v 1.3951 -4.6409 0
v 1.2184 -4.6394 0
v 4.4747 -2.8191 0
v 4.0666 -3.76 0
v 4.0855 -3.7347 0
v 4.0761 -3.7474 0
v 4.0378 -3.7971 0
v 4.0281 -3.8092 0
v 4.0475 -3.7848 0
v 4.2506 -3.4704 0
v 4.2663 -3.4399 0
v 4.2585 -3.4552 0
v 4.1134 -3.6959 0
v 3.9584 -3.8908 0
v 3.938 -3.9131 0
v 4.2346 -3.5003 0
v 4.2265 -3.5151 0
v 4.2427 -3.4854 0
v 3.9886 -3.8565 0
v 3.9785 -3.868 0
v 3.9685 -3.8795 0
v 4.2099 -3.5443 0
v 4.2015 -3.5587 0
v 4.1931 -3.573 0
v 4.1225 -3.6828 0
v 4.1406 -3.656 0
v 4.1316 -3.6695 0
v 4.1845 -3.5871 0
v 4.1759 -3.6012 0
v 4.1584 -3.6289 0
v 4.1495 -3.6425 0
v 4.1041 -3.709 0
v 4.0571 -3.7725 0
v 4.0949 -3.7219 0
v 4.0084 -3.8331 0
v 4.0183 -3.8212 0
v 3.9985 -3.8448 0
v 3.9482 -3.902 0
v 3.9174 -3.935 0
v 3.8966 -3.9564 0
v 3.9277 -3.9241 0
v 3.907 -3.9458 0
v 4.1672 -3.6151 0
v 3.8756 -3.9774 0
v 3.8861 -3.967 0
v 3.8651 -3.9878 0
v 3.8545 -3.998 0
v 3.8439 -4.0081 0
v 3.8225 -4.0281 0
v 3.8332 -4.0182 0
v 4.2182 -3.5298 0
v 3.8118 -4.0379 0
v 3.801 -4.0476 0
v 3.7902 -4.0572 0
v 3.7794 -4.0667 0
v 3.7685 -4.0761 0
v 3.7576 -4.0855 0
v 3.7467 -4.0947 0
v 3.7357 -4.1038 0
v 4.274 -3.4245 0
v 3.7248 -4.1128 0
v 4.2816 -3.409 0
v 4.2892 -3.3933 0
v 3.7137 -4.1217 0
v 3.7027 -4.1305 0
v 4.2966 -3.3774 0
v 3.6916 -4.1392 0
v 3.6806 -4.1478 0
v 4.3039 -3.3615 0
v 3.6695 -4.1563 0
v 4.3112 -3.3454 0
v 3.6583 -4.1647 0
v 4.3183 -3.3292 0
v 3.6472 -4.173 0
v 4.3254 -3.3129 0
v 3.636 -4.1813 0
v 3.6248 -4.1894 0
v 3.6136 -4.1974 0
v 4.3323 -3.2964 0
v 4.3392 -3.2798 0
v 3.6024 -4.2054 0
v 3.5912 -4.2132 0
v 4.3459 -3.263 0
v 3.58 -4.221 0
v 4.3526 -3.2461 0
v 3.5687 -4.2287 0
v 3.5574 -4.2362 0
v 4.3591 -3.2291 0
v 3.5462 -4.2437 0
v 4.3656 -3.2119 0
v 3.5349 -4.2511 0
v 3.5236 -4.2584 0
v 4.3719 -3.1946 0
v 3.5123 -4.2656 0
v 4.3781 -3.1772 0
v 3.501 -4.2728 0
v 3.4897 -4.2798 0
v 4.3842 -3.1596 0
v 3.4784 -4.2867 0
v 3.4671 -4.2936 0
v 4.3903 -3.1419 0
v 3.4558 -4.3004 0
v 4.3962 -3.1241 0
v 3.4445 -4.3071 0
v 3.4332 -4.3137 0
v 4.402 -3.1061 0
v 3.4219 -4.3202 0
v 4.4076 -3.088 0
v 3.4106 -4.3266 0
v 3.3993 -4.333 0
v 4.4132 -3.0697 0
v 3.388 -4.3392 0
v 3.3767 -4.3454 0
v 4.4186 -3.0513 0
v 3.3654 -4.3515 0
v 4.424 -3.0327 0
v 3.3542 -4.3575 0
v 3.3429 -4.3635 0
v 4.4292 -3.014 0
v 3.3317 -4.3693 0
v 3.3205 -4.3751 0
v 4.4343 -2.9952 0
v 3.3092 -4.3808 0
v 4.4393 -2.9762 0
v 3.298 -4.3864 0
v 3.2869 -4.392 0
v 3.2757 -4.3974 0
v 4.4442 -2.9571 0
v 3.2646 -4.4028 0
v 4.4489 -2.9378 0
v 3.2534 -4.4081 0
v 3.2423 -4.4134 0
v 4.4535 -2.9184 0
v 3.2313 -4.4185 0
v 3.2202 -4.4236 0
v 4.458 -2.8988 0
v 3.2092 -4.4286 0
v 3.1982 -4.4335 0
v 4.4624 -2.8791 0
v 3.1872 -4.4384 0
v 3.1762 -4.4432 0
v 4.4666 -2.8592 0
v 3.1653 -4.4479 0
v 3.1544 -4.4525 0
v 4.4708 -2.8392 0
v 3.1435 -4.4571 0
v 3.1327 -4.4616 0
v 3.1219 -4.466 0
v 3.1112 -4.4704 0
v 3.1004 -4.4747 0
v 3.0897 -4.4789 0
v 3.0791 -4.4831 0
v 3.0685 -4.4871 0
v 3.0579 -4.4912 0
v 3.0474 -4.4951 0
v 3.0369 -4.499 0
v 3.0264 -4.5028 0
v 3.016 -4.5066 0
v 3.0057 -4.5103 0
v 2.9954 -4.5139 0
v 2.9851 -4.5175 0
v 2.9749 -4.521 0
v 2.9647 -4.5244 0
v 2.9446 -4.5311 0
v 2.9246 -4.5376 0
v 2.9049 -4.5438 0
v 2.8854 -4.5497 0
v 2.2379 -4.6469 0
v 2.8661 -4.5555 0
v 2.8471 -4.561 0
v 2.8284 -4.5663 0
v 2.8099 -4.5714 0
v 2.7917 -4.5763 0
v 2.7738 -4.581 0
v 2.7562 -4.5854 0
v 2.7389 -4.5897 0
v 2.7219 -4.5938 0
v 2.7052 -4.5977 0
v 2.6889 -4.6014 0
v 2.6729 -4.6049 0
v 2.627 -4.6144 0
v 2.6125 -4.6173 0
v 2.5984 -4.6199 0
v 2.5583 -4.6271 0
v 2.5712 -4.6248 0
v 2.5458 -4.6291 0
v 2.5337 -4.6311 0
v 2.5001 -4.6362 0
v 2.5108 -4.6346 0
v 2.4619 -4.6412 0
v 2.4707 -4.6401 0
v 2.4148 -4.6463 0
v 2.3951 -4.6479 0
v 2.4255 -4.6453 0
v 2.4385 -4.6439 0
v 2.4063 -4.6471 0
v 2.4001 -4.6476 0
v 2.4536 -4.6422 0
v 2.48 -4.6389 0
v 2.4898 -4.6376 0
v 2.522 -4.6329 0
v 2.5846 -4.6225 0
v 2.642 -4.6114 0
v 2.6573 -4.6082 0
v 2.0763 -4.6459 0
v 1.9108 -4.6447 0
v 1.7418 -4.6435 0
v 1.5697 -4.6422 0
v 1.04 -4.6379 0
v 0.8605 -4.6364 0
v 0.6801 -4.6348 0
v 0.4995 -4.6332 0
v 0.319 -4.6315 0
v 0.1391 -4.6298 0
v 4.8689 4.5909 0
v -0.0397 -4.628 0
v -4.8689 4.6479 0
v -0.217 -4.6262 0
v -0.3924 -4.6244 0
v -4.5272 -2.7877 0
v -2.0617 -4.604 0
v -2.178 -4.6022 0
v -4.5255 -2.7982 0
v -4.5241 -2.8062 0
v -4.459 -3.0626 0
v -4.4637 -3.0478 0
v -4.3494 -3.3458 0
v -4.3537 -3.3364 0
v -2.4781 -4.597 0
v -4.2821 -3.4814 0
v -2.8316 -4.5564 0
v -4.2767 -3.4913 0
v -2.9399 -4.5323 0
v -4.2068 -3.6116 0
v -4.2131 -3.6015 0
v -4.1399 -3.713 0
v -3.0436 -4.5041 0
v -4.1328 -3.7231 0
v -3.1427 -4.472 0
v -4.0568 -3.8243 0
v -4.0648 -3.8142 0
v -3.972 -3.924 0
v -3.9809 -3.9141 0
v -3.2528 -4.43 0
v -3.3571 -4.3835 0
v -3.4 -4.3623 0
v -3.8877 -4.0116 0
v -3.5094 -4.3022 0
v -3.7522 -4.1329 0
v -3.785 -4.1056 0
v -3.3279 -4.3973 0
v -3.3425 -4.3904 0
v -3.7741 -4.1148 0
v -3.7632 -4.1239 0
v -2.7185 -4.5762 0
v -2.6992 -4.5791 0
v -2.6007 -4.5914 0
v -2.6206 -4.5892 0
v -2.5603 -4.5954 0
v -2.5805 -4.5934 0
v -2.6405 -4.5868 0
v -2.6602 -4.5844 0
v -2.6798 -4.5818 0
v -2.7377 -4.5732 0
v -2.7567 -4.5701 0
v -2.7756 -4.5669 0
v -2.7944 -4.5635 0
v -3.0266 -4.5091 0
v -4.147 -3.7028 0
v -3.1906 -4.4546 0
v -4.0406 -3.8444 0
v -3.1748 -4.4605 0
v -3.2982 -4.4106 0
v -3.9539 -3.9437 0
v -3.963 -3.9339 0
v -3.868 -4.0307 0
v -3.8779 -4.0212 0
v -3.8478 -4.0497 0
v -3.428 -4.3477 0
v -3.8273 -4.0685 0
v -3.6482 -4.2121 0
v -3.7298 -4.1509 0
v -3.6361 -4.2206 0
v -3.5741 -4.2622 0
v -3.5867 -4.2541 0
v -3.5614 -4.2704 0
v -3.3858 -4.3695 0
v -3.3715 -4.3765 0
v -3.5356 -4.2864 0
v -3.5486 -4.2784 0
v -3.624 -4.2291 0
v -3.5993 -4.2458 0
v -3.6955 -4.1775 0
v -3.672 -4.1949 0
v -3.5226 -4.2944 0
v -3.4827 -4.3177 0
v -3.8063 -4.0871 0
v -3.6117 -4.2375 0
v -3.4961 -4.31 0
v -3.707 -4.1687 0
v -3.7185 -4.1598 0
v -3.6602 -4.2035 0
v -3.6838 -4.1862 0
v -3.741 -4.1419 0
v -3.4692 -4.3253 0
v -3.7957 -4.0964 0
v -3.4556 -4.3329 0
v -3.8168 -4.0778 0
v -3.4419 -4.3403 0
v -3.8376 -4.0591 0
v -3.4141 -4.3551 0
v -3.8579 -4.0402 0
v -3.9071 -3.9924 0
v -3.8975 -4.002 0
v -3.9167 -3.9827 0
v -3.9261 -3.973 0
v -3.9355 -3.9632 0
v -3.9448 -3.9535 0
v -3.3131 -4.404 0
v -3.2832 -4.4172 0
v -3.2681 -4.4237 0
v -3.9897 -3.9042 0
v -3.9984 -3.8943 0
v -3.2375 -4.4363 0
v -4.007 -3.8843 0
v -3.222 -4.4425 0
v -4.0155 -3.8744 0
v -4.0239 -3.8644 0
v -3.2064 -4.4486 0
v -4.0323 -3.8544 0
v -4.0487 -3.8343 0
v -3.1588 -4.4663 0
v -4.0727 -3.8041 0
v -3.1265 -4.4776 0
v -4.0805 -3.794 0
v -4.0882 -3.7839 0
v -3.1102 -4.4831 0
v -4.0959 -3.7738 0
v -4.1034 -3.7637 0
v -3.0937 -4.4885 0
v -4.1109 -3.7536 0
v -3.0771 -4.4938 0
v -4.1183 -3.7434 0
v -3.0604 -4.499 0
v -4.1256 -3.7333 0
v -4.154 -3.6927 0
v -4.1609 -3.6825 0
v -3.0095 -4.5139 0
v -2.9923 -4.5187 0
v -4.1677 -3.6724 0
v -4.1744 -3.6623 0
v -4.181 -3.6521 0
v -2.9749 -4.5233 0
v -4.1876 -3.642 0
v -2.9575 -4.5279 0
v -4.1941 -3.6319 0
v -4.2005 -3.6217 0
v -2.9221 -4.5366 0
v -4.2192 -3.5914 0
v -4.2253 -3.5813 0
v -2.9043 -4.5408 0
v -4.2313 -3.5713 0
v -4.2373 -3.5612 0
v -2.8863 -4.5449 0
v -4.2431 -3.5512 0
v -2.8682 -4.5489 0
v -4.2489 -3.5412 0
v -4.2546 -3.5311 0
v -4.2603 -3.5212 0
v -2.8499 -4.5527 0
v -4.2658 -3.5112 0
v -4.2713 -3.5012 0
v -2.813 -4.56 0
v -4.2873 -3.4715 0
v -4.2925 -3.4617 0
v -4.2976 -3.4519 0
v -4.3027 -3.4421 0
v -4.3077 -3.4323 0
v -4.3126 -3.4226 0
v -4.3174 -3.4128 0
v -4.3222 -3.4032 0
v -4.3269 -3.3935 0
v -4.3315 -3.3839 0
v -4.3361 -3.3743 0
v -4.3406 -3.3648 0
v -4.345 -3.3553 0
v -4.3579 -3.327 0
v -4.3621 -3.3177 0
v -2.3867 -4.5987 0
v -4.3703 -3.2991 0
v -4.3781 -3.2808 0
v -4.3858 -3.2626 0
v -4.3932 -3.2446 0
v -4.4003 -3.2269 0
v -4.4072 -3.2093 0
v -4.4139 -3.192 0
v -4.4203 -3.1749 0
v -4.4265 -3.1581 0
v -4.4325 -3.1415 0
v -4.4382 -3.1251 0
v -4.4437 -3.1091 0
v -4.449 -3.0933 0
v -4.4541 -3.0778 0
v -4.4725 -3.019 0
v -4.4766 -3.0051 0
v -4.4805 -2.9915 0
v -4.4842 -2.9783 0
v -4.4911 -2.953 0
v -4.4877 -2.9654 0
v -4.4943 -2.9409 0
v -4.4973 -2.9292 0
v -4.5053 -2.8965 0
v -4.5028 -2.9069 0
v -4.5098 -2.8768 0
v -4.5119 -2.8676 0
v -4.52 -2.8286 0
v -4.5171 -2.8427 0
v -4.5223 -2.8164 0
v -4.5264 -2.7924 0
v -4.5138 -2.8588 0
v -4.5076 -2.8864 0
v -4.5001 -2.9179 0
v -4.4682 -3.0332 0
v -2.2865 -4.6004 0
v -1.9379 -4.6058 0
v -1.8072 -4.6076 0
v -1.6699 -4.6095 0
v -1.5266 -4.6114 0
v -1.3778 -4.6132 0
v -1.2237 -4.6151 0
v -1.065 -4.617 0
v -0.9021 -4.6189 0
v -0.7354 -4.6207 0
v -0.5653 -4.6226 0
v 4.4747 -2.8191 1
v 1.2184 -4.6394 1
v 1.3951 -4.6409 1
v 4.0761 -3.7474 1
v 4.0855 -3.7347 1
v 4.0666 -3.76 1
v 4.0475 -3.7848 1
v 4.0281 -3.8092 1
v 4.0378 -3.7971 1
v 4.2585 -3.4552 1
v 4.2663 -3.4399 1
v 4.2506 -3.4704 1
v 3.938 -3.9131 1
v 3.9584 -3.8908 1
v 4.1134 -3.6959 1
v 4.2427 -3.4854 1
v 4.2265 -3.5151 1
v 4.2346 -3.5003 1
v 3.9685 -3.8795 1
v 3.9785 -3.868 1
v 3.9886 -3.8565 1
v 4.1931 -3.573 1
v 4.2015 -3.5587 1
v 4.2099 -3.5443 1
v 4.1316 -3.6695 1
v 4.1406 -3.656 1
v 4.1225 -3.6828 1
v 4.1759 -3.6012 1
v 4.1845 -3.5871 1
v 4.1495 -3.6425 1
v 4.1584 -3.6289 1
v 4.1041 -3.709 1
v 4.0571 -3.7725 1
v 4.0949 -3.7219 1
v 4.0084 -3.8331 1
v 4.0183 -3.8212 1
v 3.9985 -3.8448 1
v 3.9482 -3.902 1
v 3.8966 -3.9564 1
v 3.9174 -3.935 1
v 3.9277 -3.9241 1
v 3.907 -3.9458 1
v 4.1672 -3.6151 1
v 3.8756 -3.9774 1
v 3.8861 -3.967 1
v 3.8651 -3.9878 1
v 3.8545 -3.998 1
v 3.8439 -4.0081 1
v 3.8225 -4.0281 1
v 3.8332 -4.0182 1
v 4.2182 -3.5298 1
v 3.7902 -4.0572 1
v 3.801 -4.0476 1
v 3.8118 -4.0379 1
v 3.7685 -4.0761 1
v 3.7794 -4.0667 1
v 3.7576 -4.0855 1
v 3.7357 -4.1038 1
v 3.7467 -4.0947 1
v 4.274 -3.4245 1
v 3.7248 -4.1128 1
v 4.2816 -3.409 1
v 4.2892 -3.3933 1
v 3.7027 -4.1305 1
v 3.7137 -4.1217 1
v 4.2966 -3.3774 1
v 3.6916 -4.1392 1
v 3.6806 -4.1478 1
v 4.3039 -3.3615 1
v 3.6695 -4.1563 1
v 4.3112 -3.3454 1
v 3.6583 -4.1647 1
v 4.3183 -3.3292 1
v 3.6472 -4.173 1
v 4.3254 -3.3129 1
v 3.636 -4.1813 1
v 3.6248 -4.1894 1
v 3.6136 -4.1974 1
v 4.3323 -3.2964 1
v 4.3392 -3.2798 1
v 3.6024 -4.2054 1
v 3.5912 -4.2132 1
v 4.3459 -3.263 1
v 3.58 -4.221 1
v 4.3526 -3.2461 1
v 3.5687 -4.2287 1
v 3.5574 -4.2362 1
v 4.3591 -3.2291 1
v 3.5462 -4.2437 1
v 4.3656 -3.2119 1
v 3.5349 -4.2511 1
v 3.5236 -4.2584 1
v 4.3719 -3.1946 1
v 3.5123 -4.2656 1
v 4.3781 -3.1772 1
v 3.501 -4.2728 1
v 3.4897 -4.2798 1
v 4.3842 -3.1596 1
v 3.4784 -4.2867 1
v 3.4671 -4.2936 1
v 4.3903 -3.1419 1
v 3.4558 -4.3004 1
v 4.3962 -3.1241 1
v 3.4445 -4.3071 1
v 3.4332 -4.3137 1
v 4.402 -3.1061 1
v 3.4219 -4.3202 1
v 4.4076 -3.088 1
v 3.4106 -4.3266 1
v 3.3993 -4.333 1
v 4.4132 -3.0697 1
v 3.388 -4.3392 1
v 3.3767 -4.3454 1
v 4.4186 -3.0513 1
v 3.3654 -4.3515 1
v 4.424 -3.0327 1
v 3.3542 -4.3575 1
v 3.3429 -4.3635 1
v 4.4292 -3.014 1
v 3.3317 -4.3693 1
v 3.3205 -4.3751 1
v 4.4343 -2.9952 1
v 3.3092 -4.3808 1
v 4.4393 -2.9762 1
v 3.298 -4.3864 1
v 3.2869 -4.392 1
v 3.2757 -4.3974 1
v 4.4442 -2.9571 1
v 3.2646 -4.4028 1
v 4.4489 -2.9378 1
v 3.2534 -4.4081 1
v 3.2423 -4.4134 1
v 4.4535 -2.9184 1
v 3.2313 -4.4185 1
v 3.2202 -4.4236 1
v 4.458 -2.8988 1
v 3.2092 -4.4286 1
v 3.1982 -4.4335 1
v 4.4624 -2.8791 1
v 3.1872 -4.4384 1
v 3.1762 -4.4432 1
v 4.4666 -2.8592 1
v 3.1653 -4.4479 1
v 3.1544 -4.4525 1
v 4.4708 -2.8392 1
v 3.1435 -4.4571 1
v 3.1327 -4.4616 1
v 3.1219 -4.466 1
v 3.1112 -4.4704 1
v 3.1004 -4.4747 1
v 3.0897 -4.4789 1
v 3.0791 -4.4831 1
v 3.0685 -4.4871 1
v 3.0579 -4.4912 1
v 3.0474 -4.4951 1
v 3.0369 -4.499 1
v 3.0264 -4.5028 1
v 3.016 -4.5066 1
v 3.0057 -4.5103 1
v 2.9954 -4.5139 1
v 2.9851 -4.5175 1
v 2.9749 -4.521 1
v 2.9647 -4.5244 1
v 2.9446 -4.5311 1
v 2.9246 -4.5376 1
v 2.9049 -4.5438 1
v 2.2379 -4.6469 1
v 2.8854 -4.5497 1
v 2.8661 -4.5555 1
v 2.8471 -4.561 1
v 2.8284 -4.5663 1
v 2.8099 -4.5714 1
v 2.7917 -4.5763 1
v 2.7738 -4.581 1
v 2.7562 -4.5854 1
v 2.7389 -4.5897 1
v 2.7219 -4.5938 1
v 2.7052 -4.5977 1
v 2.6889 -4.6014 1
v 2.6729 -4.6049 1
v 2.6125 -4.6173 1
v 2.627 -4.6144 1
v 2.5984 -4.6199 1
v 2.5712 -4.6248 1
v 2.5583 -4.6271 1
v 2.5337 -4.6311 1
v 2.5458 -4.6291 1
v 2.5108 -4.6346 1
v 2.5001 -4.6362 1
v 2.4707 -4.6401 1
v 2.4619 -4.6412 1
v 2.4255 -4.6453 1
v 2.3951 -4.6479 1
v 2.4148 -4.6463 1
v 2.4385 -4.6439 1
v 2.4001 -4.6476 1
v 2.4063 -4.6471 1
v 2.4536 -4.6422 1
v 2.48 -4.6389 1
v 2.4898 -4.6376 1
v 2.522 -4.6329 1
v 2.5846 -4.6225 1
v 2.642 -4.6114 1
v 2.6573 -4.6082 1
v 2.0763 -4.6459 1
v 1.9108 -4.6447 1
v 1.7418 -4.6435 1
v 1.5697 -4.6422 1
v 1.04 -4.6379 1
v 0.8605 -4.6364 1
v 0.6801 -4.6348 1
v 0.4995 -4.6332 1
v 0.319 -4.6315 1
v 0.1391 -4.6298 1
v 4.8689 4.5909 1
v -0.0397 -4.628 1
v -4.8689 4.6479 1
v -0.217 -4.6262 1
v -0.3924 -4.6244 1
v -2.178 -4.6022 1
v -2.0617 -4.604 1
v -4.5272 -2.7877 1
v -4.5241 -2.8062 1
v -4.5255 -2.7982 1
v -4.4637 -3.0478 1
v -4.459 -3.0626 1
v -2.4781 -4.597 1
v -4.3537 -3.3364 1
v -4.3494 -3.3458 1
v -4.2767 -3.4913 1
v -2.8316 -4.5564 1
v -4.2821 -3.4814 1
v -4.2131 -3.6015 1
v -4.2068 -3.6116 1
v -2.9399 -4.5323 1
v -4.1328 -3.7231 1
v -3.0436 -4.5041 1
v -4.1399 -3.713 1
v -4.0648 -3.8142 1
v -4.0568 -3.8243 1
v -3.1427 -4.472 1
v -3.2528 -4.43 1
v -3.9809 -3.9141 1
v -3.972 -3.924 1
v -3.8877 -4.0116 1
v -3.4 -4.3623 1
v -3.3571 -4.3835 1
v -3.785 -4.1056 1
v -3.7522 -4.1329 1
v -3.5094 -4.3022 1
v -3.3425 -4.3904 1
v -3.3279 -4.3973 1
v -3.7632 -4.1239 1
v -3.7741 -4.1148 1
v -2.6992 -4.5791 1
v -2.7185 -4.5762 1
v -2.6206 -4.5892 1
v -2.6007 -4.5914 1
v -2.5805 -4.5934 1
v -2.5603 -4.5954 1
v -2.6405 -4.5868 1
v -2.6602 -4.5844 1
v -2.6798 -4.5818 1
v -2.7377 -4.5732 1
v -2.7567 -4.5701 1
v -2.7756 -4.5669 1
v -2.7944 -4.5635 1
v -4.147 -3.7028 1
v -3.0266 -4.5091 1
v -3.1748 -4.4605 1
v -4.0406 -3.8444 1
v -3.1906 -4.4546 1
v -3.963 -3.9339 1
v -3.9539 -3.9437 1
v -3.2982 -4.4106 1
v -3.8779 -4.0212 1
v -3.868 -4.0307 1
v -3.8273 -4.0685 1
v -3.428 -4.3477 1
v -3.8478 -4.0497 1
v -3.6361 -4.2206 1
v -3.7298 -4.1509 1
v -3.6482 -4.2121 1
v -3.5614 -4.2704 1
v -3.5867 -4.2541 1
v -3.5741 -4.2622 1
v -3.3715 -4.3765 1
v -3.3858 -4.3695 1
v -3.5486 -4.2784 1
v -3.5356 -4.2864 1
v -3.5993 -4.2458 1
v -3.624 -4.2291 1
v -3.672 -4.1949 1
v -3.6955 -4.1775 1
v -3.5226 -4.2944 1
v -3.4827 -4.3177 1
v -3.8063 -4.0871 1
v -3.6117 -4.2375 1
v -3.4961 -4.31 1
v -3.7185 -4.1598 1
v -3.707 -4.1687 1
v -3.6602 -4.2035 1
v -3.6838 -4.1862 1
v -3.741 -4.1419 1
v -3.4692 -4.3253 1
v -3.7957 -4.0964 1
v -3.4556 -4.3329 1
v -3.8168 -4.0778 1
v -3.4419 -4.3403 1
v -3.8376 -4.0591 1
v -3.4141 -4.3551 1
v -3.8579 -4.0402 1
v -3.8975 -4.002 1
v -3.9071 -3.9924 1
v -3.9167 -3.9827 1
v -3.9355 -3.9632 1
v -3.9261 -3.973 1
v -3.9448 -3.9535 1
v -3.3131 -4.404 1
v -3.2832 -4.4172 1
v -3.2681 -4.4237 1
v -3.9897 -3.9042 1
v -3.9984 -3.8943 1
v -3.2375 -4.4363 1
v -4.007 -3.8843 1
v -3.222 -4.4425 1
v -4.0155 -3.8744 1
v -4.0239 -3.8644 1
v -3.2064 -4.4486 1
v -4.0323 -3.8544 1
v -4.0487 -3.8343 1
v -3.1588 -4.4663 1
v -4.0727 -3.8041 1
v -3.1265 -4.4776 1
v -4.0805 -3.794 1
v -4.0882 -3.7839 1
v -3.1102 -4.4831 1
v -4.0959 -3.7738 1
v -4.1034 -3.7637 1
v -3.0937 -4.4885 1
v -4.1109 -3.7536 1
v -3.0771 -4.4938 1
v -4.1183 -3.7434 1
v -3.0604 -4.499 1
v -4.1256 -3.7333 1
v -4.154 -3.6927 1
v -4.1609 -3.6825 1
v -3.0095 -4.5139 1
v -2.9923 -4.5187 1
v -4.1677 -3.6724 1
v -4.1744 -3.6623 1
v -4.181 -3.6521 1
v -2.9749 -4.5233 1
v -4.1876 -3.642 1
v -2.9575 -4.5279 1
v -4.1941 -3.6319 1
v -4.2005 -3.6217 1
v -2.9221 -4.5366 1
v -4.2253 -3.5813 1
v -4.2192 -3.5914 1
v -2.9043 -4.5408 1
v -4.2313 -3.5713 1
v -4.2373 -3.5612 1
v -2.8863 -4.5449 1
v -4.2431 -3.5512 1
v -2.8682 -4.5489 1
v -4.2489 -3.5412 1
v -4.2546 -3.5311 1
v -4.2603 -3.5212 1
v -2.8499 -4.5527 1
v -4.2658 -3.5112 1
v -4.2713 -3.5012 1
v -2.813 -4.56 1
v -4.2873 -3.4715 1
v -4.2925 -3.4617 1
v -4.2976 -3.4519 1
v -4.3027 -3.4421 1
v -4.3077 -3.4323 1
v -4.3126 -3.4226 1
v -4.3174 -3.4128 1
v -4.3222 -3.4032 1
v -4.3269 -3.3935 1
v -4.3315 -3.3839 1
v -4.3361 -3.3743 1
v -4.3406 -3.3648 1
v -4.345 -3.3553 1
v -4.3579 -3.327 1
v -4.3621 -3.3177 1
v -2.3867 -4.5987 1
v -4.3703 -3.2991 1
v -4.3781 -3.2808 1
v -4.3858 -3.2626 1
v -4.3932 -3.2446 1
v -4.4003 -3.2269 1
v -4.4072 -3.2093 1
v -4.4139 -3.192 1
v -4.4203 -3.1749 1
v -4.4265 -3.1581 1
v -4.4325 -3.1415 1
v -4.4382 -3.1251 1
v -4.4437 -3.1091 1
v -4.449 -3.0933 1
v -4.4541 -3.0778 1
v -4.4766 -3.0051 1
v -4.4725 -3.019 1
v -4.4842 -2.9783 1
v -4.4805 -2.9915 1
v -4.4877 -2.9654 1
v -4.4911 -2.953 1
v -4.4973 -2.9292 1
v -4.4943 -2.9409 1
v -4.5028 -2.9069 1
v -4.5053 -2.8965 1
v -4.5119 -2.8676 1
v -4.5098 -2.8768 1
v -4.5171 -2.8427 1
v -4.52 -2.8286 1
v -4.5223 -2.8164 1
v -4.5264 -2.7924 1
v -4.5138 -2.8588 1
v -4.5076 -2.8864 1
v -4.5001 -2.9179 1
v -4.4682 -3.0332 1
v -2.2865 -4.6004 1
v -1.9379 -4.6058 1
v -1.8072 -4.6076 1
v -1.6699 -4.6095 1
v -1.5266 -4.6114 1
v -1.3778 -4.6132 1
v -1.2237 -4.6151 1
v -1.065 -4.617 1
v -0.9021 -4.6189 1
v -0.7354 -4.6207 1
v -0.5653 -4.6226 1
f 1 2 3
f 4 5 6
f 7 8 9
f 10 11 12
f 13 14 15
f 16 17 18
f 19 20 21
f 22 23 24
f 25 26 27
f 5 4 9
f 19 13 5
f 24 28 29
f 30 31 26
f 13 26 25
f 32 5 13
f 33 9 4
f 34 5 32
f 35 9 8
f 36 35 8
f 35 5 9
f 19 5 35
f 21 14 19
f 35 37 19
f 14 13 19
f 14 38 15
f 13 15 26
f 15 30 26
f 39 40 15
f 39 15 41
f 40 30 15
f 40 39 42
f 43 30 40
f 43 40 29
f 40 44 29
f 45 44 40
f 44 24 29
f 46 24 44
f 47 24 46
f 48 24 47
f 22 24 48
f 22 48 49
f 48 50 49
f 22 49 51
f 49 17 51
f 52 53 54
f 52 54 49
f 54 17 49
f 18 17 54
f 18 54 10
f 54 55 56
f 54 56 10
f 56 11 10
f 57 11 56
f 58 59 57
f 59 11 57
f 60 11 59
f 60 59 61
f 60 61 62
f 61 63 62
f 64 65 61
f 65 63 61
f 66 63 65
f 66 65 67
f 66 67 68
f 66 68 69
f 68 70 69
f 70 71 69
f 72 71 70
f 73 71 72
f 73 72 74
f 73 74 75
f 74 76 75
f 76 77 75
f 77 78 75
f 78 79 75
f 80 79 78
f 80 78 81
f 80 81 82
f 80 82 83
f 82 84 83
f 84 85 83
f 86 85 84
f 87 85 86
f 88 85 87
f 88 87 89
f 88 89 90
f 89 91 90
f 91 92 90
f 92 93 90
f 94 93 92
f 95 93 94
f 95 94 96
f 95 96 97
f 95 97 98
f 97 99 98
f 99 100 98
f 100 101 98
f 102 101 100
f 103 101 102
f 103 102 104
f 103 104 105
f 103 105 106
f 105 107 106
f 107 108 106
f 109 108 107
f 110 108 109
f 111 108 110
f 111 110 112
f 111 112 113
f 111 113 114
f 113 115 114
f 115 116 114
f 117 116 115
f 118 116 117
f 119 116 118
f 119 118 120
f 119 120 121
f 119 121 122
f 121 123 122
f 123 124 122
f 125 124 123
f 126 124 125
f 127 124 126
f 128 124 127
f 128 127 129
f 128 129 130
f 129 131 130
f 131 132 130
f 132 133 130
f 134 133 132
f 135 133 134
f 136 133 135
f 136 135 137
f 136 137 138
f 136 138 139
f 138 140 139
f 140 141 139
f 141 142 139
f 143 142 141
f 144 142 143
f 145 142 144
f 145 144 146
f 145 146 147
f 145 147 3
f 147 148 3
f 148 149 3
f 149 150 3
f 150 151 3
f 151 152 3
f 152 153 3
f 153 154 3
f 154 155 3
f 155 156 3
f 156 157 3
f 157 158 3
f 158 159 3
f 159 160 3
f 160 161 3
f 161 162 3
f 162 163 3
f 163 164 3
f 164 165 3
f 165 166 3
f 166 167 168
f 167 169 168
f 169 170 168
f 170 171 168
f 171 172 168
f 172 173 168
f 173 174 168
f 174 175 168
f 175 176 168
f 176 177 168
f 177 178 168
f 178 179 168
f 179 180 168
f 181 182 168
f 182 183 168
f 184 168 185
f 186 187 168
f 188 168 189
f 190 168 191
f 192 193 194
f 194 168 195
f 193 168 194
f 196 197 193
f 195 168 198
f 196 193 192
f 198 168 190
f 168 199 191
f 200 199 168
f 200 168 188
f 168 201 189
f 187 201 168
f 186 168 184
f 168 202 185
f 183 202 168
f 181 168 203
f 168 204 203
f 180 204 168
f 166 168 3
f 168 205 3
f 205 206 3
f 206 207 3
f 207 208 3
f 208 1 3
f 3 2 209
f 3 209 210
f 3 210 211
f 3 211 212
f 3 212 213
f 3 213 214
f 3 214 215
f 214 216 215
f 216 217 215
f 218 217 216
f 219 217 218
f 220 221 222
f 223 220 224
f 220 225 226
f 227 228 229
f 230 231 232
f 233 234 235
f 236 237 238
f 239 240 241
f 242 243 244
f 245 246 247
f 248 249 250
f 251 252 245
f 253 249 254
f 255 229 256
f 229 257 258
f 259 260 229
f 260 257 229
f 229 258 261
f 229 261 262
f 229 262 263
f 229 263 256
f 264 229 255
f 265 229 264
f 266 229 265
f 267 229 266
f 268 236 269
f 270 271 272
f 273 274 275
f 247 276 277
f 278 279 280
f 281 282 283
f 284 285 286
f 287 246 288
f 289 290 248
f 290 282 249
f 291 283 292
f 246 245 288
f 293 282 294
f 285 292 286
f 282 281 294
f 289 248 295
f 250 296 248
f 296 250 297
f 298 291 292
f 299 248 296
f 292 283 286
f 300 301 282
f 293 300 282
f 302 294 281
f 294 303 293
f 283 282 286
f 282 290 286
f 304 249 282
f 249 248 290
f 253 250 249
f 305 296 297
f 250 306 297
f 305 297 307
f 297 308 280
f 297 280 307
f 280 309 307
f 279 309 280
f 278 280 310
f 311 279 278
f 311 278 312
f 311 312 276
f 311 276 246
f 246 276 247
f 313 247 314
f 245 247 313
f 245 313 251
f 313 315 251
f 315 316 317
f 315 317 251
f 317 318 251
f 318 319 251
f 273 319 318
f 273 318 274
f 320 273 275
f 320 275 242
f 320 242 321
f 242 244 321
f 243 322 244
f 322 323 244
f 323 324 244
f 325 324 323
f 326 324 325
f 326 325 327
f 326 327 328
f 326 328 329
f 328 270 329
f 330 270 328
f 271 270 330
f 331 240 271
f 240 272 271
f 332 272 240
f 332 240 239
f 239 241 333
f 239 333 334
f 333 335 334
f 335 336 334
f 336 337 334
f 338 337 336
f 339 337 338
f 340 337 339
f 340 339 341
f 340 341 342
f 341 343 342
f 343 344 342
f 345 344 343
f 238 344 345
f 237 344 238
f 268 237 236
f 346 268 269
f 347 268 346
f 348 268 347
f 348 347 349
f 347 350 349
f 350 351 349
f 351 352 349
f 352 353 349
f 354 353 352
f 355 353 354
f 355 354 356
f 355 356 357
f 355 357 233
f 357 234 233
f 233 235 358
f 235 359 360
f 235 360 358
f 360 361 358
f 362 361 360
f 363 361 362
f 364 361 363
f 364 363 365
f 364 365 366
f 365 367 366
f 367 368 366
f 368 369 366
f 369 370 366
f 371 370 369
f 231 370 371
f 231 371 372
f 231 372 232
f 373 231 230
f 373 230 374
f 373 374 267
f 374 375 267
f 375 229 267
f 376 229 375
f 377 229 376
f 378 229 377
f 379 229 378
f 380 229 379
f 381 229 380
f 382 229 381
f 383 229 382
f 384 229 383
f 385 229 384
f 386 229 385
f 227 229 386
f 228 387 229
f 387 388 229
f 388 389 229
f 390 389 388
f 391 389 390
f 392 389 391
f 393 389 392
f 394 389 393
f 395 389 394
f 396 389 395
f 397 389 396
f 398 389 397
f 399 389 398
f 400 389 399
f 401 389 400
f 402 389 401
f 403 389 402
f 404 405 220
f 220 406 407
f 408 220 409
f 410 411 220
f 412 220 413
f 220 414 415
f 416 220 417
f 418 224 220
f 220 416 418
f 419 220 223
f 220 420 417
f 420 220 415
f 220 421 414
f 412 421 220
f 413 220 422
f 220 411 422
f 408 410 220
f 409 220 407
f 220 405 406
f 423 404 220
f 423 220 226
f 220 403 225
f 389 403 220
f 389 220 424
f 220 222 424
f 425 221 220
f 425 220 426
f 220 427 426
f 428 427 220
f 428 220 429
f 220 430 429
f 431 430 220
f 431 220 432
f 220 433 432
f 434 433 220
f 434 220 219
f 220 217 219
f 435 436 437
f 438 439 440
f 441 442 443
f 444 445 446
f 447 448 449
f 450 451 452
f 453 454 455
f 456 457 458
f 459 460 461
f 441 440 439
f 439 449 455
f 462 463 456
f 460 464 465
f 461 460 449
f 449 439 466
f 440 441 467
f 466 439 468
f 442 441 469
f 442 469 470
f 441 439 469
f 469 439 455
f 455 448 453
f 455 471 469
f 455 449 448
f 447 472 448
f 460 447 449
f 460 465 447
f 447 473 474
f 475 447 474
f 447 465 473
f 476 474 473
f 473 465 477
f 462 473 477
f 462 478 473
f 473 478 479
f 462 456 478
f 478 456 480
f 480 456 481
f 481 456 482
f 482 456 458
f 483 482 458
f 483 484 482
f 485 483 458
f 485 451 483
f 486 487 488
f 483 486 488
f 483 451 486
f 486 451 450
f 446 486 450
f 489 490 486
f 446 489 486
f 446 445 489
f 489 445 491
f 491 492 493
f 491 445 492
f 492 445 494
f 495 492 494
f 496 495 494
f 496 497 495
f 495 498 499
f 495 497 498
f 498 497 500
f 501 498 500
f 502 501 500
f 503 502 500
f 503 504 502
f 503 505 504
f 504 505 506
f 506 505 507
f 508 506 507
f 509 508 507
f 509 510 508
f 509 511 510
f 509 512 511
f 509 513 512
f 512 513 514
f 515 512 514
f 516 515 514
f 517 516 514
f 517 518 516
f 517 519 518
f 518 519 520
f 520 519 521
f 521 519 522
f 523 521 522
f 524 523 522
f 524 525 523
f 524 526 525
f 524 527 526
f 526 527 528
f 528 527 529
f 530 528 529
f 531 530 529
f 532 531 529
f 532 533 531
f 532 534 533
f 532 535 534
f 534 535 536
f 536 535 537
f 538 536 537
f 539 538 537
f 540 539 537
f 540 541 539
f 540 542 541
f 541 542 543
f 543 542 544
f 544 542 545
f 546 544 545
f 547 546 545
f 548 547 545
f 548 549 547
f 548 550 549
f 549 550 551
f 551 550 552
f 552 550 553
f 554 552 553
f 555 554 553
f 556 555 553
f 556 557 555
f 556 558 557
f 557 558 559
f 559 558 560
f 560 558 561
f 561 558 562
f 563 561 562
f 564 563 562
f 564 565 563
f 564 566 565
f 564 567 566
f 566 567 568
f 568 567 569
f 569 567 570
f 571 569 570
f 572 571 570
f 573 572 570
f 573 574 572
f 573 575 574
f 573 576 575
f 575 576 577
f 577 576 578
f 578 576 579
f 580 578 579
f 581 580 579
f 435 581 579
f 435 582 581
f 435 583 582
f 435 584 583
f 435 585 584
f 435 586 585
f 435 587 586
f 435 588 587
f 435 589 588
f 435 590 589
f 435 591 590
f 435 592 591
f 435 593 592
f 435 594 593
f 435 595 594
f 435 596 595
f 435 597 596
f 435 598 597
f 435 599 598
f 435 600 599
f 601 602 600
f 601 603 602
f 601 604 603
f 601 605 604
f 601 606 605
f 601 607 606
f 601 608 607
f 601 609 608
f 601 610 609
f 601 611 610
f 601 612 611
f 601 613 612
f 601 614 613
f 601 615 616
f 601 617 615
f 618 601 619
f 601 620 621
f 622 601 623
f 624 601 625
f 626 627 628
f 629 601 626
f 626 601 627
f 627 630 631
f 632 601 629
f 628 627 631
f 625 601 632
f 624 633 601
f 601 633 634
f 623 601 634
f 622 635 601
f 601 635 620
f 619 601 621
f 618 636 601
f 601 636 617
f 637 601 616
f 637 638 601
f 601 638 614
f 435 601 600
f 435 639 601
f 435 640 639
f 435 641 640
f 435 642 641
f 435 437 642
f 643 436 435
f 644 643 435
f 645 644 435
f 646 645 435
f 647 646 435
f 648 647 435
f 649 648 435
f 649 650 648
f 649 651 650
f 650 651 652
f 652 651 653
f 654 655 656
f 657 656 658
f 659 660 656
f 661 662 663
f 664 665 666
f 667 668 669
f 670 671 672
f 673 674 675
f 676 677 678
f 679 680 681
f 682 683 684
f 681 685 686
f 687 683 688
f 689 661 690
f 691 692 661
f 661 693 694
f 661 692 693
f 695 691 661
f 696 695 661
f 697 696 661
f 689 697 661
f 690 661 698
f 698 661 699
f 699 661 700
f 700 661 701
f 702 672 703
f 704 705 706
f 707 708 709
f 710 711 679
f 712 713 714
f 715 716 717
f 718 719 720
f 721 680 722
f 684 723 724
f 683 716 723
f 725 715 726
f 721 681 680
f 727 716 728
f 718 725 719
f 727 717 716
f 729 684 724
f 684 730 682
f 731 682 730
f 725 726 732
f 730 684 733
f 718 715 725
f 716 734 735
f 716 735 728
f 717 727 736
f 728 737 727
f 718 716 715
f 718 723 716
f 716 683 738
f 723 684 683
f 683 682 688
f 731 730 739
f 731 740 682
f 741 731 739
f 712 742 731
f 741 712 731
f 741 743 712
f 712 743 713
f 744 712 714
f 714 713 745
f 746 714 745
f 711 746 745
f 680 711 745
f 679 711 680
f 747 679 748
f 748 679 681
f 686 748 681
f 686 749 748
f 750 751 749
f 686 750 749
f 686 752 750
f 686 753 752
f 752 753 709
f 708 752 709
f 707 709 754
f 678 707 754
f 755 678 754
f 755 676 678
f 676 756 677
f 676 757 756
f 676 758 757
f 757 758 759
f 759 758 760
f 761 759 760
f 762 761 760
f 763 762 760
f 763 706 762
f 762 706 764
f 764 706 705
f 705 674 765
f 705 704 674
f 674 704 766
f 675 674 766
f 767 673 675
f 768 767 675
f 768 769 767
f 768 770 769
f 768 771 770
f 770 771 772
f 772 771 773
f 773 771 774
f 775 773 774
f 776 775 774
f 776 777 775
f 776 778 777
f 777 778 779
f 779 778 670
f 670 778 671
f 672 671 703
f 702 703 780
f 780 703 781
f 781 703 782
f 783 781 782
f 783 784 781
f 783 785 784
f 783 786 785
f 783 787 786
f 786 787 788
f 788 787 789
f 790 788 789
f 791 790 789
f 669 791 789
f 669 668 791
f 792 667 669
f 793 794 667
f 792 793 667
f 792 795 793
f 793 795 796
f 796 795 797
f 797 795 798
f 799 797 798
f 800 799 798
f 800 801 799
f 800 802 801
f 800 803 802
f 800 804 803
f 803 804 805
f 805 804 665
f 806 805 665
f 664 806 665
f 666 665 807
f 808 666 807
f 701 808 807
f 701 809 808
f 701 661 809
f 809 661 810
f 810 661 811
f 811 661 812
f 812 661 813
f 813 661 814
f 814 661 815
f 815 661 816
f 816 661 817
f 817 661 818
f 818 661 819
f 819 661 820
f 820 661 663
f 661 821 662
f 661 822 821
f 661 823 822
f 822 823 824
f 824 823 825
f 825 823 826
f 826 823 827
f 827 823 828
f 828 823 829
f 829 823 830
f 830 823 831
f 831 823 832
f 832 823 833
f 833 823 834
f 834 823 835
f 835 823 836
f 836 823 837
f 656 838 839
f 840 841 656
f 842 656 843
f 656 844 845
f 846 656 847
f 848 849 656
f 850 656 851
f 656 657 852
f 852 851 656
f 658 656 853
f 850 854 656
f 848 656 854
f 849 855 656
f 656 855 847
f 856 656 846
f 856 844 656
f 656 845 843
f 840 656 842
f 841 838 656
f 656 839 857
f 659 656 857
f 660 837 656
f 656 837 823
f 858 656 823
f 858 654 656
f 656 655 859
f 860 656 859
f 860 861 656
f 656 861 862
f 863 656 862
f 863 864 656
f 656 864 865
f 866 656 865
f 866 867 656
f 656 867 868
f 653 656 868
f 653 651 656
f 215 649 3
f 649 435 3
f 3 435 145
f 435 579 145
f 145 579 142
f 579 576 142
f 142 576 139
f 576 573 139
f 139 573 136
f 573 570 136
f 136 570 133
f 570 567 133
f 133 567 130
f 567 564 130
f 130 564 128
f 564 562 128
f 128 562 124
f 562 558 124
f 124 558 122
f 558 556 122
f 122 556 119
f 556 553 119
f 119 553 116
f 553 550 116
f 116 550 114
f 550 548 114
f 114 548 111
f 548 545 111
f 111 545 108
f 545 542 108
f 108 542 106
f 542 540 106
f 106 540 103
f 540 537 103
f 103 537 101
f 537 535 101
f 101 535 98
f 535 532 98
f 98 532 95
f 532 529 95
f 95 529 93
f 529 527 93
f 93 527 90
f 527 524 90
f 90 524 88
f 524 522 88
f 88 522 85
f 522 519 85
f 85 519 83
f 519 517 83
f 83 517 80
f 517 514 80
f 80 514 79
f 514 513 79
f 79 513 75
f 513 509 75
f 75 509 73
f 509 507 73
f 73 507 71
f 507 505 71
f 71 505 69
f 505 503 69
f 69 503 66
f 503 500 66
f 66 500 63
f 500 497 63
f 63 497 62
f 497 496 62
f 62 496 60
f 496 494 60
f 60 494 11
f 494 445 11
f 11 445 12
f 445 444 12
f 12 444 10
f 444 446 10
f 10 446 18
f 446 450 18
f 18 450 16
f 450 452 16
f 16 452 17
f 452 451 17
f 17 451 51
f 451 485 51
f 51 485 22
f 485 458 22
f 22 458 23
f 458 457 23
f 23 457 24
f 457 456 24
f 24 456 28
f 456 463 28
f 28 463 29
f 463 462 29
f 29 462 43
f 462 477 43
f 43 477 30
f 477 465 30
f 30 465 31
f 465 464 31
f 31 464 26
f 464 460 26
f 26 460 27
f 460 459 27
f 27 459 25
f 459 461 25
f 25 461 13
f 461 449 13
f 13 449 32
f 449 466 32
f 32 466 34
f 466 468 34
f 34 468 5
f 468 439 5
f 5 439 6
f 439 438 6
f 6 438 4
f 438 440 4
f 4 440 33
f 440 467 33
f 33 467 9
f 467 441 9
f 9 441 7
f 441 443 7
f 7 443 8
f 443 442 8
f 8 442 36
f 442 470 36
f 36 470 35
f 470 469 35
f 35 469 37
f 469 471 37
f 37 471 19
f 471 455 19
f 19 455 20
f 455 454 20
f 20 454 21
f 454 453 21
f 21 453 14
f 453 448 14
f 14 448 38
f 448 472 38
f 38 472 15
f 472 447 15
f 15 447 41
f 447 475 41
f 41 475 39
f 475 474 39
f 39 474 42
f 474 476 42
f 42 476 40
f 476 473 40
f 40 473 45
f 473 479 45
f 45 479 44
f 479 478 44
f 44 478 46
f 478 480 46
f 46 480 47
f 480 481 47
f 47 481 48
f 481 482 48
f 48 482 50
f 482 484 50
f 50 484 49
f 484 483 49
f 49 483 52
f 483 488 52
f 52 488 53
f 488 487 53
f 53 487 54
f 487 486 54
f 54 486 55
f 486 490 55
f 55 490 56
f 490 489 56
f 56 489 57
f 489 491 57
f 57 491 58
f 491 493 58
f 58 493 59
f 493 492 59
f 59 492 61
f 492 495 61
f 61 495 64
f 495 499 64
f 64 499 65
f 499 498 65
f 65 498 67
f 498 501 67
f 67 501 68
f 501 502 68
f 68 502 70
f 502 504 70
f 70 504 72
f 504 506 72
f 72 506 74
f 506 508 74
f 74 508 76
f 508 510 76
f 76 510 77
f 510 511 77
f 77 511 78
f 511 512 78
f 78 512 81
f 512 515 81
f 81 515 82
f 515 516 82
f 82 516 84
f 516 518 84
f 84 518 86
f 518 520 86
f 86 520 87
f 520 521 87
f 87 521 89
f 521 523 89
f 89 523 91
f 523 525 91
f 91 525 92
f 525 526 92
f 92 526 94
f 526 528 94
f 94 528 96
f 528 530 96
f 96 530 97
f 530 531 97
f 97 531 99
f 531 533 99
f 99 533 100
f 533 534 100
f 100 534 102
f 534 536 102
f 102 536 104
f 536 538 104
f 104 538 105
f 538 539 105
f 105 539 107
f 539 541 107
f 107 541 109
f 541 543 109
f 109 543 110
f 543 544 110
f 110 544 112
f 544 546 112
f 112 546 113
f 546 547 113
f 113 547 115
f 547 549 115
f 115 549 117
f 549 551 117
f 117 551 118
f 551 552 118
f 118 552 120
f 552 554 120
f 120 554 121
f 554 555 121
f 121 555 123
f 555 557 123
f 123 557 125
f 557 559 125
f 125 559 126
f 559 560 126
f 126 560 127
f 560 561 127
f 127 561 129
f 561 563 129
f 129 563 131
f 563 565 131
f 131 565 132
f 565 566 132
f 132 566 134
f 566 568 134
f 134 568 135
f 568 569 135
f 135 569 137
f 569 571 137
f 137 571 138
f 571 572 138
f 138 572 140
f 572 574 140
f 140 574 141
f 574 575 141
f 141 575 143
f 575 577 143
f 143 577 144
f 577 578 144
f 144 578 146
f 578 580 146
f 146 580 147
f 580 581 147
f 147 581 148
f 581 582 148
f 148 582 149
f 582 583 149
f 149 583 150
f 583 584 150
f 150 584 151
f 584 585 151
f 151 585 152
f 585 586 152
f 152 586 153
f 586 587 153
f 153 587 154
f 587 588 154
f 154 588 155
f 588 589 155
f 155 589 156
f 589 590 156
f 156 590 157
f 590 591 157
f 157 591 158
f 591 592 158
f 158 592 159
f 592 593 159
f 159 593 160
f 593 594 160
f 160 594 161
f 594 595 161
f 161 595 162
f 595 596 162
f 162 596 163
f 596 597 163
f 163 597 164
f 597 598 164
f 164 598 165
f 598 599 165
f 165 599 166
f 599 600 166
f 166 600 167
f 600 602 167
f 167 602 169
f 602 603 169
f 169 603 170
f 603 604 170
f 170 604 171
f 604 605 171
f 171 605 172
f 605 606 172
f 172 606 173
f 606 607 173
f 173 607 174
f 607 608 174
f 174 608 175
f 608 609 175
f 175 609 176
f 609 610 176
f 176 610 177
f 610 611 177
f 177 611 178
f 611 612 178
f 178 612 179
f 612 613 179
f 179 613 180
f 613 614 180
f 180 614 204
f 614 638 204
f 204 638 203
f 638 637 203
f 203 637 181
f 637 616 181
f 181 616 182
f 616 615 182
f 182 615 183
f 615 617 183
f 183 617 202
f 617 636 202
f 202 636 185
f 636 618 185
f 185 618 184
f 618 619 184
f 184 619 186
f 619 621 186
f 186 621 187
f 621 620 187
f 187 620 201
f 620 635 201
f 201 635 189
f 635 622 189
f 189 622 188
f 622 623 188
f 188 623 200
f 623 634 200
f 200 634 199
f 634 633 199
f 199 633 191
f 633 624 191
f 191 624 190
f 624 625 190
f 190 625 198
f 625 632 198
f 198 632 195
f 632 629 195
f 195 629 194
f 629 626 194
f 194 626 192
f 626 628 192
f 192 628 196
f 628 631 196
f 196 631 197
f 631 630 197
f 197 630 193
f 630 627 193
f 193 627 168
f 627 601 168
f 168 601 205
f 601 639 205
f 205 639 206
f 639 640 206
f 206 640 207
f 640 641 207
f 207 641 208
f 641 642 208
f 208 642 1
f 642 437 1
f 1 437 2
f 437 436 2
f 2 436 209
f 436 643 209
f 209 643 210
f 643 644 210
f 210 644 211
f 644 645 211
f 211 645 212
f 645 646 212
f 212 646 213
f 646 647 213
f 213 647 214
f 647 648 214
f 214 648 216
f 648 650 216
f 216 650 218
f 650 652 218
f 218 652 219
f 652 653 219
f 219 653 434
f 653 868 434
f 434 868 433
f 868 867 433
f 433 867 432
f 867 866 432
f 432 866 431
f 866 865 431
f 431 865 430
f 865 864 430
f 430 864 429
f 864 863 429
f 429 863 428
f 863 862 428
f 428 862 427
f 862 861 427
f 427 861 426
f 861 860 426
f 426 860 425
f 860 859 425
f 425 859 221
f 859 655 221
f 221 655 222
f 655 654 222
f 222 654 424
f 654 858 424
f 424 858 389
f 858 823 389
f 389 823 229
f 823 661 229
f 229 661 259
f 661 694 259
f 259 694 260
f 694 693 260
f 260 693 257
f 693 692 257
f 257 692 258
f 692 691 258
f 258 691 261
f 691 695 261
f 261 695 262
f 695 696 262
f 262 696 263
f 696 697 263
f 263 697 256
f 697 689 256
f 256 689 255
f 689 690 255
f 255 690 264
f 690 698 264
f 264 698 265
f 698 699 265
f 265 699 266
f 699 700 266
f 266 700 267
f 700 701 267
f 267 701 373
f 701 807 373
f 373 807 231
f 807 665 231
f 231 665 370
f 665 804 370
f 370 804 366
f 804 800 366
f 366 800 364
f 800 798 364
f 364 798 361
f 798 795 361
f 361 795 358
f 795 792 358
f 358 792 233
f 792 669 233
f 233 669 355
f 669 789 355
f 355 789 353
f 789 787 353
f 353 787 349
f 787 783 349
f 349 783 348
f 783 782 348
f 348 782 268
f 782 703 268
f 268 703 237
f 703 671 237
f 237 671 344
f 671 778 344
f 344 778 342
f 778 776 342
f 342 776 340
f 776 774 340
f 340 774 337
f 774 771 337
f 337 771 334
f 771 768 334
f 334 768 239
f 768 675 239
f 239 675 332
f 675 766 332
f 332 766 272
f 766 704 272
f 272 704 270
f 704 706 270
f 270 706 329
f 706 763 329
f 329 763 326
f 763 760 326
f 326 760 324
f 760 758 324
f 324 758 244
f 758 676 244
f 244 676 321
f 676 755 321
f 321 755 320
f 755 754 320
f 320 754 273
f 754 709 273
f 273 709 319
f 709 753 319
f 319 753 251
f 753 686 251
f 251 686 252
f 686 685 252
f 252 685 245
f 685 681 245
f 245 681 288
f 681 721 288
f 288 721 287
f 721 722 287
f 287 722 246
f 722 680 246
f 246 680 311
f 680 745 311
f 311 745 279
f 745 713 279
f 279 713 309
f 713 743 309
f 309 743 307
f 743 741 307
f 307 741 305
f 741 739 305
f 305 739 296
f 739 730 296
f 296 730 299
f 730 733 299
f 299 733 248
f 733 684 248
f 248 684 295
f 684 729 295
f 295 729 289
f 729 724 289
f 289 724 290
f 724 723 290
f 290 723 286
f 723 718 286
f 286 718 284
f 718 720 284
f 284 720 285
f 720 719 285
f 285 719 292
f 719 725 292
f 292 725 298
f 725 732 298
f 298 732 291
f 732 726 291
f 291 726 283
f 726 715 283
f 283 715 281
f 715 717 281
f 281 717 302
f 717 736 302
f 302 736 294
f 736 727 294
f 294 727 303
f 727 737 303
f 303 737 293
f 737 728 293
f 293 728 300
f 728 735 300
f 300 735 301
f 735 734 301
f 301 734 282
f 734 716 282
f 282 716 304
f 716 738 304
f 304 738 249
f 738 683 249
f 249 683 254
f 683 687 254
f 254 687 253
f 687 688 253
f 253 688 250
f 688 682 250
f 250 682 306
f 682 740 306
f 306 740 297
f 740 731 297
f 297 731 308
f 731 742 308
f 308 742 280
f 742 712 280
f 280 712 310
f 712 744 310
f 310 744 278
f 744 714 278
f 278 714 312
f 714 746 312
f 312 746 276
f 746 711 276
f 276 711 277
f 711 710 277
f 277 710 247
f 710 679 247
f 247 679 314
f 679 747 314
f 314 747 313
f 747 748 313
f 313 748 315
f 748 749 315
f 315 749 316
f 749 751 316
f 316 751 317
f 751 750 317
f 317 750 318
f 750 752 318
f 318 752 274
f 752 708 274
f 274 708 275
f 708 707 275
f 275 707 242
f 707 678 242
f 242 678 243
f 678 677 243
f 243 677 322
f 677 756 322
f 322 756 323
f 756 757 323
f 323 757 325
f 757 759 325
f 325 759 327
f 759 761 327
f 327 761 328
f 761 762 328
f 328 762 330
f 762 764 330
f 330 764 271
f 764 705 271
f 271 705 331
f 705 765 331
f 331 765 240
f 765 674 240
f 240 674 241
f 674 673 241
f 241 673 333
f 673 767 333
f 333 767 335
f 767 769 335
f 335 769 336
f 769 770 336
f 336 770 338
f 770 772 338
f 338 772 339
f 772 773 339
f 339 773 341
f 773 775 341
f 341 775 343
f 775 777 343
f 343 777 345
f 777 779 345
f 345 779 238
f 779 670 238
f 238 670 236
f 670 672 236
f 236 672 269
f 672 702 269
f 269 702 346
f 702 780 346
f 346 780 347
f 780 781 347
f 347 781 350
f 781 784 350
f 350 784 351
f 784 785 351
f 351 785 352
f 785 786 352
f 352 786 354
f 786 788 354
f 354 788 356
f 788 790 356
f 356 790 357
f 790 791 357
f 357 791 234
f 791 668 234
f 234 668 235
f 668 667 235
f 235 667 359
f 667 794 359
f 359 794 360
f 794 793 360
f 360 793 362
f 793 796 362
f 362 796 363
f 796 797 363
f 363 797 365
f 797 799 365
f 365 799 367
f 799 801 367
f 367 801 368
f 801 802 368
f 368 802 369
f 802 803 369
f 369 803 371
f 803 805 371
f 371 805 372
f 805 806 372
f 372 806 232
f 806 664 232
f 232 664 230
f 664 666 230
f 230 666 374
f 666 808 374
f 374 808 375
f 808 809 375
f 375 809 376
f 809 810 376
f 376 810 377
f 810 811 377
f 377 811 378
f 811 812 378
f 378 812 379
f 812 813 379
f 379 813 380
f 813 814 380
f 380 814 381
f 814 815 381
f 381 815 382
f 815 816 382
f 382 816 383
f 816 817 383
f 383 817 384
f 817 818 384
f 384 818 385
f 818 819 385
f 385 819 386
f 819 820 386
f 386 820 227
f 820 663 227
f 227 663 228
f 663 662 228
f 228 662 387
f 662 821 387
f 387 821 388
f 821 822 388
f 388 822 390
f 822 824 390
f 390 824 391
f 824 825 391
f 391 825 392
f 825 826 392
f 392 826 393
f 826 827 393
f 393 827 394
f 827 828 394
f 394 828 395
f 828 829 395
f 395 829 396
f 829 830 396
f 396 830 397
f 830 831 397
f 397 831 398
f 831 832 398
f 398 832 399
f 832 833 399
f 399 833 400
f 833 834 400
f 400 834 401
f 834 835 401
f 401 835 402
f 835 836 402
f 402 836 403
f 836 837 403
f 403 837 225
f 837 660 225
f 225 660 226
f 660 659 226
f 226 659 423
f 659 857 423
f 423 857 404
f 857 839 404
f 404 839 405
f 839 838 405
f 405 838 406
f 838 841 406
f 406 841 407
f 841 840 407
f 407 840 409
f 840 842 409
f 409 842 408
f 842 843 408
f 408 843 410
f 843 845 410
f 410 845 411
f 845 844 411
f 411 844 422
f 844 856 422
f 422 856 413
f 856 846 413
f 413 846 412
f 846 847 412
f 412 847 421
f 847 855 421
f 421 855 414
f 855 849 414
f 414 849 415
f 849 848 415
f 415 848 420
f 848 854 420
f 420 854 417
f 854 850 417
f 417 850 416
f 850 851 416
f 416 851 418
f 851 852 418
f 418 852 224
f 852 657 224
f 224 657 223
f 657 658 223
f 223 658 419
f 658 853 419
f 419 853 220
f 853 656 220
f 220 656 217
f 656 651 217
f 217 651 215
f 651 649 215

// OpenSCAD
// Module names are of the form poly_<inkscape-path-id>().  As a result,
// you can associate a polygon in this OpenSCAD program with the corresponding
// SVG element in the Inkscape document by looking for the XML element with
// the attribute id="inkscape-path-id".

// fudge value is used to ensure that subtracted solids are a tad taller
// in the z dimension than the polygon being subtracted from.  This helps
// keep the resulting .stl file manifold.
fudge = 0.1;

module poly_path880(h)
{
  scale([25.4/90, -25.4/90, 1]) union()
  {
    linear_extrude(height=h)
      polygon([[8.486521,16.468983],[8.504290,16.467753],[8.526117,16.466031],[8.556232,16.463405],[8.594378,16.459754],[8.640301,16.454953],[8.693743,16.448879],[8.723204,16.445327],[8.754450,16.441409],[8.787448,16.437112],[8.822165,16.432420],[8.858571,16.427317],[8.896633,16.421788],[8.936320,16.415817],[8.977599,16.409389],[9.020438,16.402489],[9.064805,16.395101],[9.110669,16.387210],[9.157997,16.378800],[9.206757,16.369856],[9.256918,16.360363],[9.308448,16.350305],[9.361313,16.339666],[9.415484,16.328432],[9.470927,16.316586],[9.527610,16.304114],[9.585502,16.291000],[9.644571,16.277229],[9.704784,16.262785],[9.766111,16.247652],[9.828517,16.231816],[9.891973,16.215261],[9.956445,16.197971],[10.021902,16.179932],[10.088312,16.161127],[10.155642,16.141541],[10.223862,16.121159],[10.292938,16.099966],[10.362840,16.077945],[10.433534,16.055082],[10.504989,16.031361],[10.540992,16.019175],[10.577173,16.006767],[10.613529,15.994138],[10.650055,15.981285],[10.686747,15.968205],[10.723601,15.954898],[10.760614,15.941361],[10.797780,15.927592],[10.835098,15.913589],[10.872561,15.899350],[10.910167,15.884874],[10.947911,15.870159],[10.985789,15.855202],[11.023797,15.840001],[11.061932,15.824556],[11.100189,15.808863],[11.138565,15.792921],[11.177054,15.776728],[11.215654,15.760282],[11.254361,15.743581],[11.293169,15.726623],[11.332076,15.709406],[11.371078,15.691929],[11.410169,15.674189],[11.449347,15.656184],[11.488608,15.637913],[11.527946,15.619373],[11.567359,15.600563],[11.606843,15.581481],[11.646392,15.562125],[11.686004,15.542492],[11.725675,15.522582],[11.765399,15.502391],[11.805174,15.481919],[11.844996,15.461162],[11.884860,15.440120],[11.924762,15.418791],[11.964698,15.397171],[12.004665,15.375260],[12.044659,15.353056],[12.084674,15.330556],[12.124708,15.307759],[12.164757,15.284662],[12.204816,15.261265],[12.244881,15.237564],[12.284949,15.213558],[12.325015,15.189245],[12.365075,15.164624],[12.405126,15.139691],[12.445163,15.114446],[12.485183,15.088886],[12.525181,15.063010],[12.565154,15.036815],[12.605096,15.010299],[12.645006,14.983461],[12.684878,14.956299],[12.724708,14.928811],[12.764493,14.900994],[12.804228,14.872847],[12.843909,14.844369],[12.883533,14.815556],[12.923096,14.786407],[12.962593,14.756921],[13.002020,14.727095],[13.041374,14.696927],[13.080650,14.666416],[13.119845,14.635559],[13.158954,14.604355],[13.197974,14.572801],[13.236900,14.540896],[13.275729,14.508638],[13.314456,14.476024],[13.353078,14.443054],[13.391590,14.409725],[13.429989,14.376034],[13.468270,14.341981],[13.506430,14.307563],[13.544464,14.272778],[13.582368,14.237625],[13.620140,14.202101],[13.657773,14.166204],[13.695266,14.129934],[13.732612,14.093286],[13.769810,14.056261],[13.806853,14.018855],[13.843740,13.981067],[13.880465,13.942896],[13.917024,13.904338],[13.953414,13.865392],[13.989631,13.826056],[14.025670,13.786329],[14.061527,13.746208],[14.097199,13.705691],[14.132682,13.664777],[14.167971,13.623463],[14.203063,13.581748],[14.237954,13.539629],[14.272639,13.497106],[14.307114,13.454175],[14.341376,13.410835],[14.375421,13.367084],[14.409244,13.322920],[14.442842,13.278341],[14.476211,13.233345],[14.509346,13.187930],[14.542243,13.142095],[14.574900,13.095837],[14.607311,13.049155],[14.639472,13.002046],[14.671380,12.954509],[14.703031,12.906541],[14.734420,12.858142],[14.765544,12.809308],[14.796399,12.760038],[14.826980,12.710330],[14.857284,12.660182],[14.887307,12.609592],[14.917044,12.558558],[14.946491,12.507079],[14.975646,12.455152],[15.004503,12.402775],[15.033059,12.349947],[15.061309,12.296665],[15.089250,12.242928],[15.116878,12.188734],[15.144188,12.134081],[15.171177,12.078966],[15.197841,12.023388],[15.224175,11.967345],[15.250176,11.910836],[15.275840,11.853857],[15.301162,11.796408],[15.326140,11.738486],[15.350767,11.680089],[15.375042,11.621216],[15.398959,11.561864],[15.422515,11.502032],[15.445706,11.441718],[15.468527,11.380919],[15.490975,11.319634],[15.513046,11.257861],[15.534735,11.195598],[15.556039,11.132842],[15.576954,11.069593],[15.597476,11.005848],[15.617600,10.941606],[15.637324,10.876863],[15.656641,10.811619],[15.675550,10.745872],[15.694045,10.679619],[15.712123,10.612858],[15.729780,10.545589],[15.747012,10.477808],[15.763814,10.409513],[15.780183,10.340704],[15.796115,10.271378],[15.811606,10.201532],[15.826651,10.131166],[15.841248,10.060277],[15.855390,9.988863],[17.252036,-16.266990],[-17.252037,-16.468985],[-16.041121,9.877634],[-16.038569,9.894408],[-16.035225,9.914994],[-16.030364,9.943372],[-16.023885,9.979290],[-16.015684,10.022491],[-16.005658,10.072722],[-15.993705,10.129729],[-15.986973,10.160693],[-15.979721,10.193256],[-15.971935,10.227385],[-15.963603,10.263049],[-15.954712,10.300216],[-15.945248,10.338854],[-15.935200,10.378932],[-15.924555,10.420417],[-15.913298,10.463277],[-15.901419,10.507482],[-15.888903,10.552998],[-15.875737,10.599795],[-15.861910,10.647840],[-15.847408,10.697102],[-15.832218,10.747549],[-15.816327,10.799149],[-15.799723,10.851869],[-15.782393,10.905680],[-15.764323,10.960548],[-15.745501,11.016441],[-15.725914,11.073329],[-15.705550,11.131179],[-15.684394,11.189959],[-15.662435,11.249637],[-15.639660,11.310183],[-15.616056,11.371563],[-15.591609,11.433746],[-15.566307,11.496701],[-15.540137,11.560395],[-15.513087,11.624797],[-15.485143,11.689875],[-15.456292,11.755596],[-15.441523,11.788689],[-15.426523,11.821930],[-15.411289,11.855317],[-15.395820,11.888844],[-15.380116,11.922509],[-15.364173,11.956307],[-15.347991,11.990235],[-15.331568,12.024287],[-15.314902,12.058461],[-15.297992,12.092752],[-15.280836,12.127156],[-15.263433,12.161670],[-15.245780,12.196289],[-15.227877,12.231009],[-15.209721,12.265827],[-15.191311,12.300738],[-15.172646,12.335738],[-15.153723,12.370824],[-15.134542,12.405992],[-15.115100,12.441237],[-15.095397,12.476555],[-15.075430,12.511943],[-15.055197,12.547397],[-15.034698,12.582912],[-15.013930,12.618485],[-14.992892,12.654112],[-14.971583,12.689788],[-14.950000,12.725510],[-14.928143,12.761274],[-14.906009,12.797075],[-14.883597,12.832910],[-14.860905,12.868775],[-14.837932,12.904666],[-14.814676,12.940578],[-14.791135,12.976509],[-14.767309,13.012453],[-14.743194,13.048407],[-14.718791,13.084368],[-14.694096,13.120330],[-14.669109,13.156290],[-14.643827,13.192244],[-14.618250,13.228188],[-14.592376,13.264118],[-14.566202,13.300031],[-14.539728,13.335921],[-14.512952,13.371785],[-14.485872,13.407620],[-14.458486,13.443421],[-14.430794,13.479184],[-14.402793,13.514905],[-14.374481,13.550581],[-14.345858,13.586206],[-14.316921,13.621778],[-14.287669,13.657293],[-14.258101,13.692745],[-14.228214,13.728132],[-14.198007,13.763450],[-14.167479,13.798693],[-14.136628,13.833860],[-14.105452,13.868944],[-14.073950,13.903944],[-14.042120,13.938853],[-14.009960,13.973669],[-13.977469,14.008388],[-13.944645,14.043005],[-13.911487,14.077517],[-13.877993,14.111920],[-13.844161,14.146209],[-13.809991,14.180381],[-13.775479,14.214431],[-13.740625,14.248357],[-13.705427,14.282153],[-13.669883,14.315815],[-13.633993,14.349341],[-13.597753,14.382725],[-13.561163,14.415964],[-13.524220,14.449054],[-13.486925,14.481991],[-13.449273,14.514771],[-13.411265,14.547390],[-13.372899,14.579843],[-13.334172,14.612128],[-13.295084,14.644240],[-13.255632,14.676174],[-13.215816,14.707928],[-13.175633,14.739497],[-13.135082,14.770877],[-13.094161,14.802064],[-13.052868,14.833054],[-13.011203,14.863843],[-12.969163,14.894428],[-12.926747,14.924803],[-12.883953,14.954966],[-12.840780,14.984912],[-12.797226,15.014638],[-12.753289,15.044139],[-12.708968,15.073411],[-12.664261,15.102450],[-12.619167,15.131253],[-12.573684,15.159815],[-12.527810,15.188133],[-12.481543,15.216202],[-12.434883,15.244018],[-12.387828,15.271578],[-12.340375,15.298878],[-12.292524,15.325913],[-12.244272,15.352680],[-12.195619,15.379174],[-12.146561,15.405392],[-12.097099,15.431330],[-12.047230,15.456983],[-11.996953,15.482348],[-11.946266,15.507420],[-11.895167,15.532196],[-11.843655,15.556672],[-11.791728,15.580844],[-11.739385,15.604708],[-11.686624,15.628259],[-11.633444,15.651495],[-11.579842,15.674410],[-11.525817,15.697001],[-11.471368,15.719264],[-11.416493,15.741195],[-11.361190,15.762790],[-11.305458,15.784045],[-11.249295,15.804956],[-11.192700,15.825519],[-11.135670,15.845730],[-11.078205,15.865585],[-11.020303,15.885080],[-10.961961,15.904211],[-10.903180,15.922975],[-10.843956,15.941366],[-10.784288,15.959382],[-10.724175,15.977018],[-10.663615,15.994271],[-10.602607,16.011135],[-10.541148,16.027608],[-10.479238,16.043686],[-10.416874,16.059363],[-10.354056,16.074637],[-10.290780,16.089503],[-10.227047,16.103958],[-10.162854,16.117997],[-10.098199,16.131617],[-10.033081,16.144813],[-9.967499,16.157582],[-9.901450,16.169919],[-9.834934,16.181821],[-9.767948,16.193283],[-9.700491,16.204302],[-9.632562,16.214874],[-9.564158,16.224994],[-9.495278,16.234659],[-9.425921,16.243865],[-9.356085,16.252607],[-9.285768,16.260882],[-9.214969,16.268686],[-9.143685,16.276015],[-9.071917,16.282864],[-8.780714,16.288690],[-8.456823,16.294666],[-8.101853,16.300779],[-7.717409,16.307012],[-7.305101,16.313351],[-6.866535,16.319780],[-6.403319,16.326285],[-5.917060,16.332849],[-5.409365,16.339459],[-4.881843,16.346098],[-4.336101,16.352751],[-3.773746,16.359405],[-3.196385,16.366042],[-2.605627,16.372648],[-2.003078,16.379209],[-1.390347,16.385708],[-0.769040,16.392130],[-0.140765,16.398461],[0.492870,16.404686],[1.130258,16.410788],[1.769792,16.416753],[2.409863,16.422566],[3.048865,16.428212],[3.685190,16.433675],[4.317231,16.438940],[4.943380,16.443992],[5.562029,16.448816],[6.171571,16.453397],[6.770399,16.457720],[7.356905,16.461769],[7.929482,16.465529],[8.486521,16.468985]]);
  }
}

poly_path880(1);
